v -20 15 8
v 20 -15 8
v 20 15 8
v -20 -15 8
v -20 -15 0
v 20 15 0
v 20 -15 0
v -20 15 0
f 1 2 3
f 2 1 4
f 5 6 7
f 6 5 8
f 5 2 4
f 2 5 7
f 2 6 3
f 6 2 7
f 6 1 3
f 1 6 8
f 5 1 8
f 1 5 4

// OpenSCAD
// file: BOSL2-2.0.766/std.scad
// Minimal BOSL2 compatibility shim for bundled gallery models.
// It implements only the helpers used by the imported OpenSCAD projects.

CENTER = [0, 0, 0];
BOTTOM = [0, 0, -1];
TOP = [0, 0, 1];
LEFT = [-1, 0, 0];
RIGHT = [1, 0, 0];
FRONT = [0, -1, 0];
BACK = [0, 1, 0];

module up(z=0) {
    translate([0, 0, z]) children();
}

module down(z=0) {
    translate([0, 0, -z]) children();
}

module attach(anchor=CENTER) {
    children();
}

module cuboid(size=[1, 1, 1], anchor=CENTER) {
    center = anchor == CENTER;
    translate(center ? [0, 0, 0] : [0, 0, size[2] / 2])
        cube(size, center=true);
    children();
}

module xcyl(h=1, r=1, anchor=CENTER) {
    center = anchor == CENTER;
    translate(center ? [0, 0, 0] : [h / 2, 0, 0])
        rotate([0, 90, 0])
            cylinder(h=h, r=r, center=true);
}
// main file
// Working pinned BOSL2 example: flat-bottomed plate with vertical rounded edges.
include <BOSL2-2.0.766/std.scad>
width = 40;
depth = 30;
height = 8;
corner_radius = 3;
$fa = $preview ? 8 : 3;
$fs = $preview ? 1 : 0.35;
assert(corner_radius >= 0 && width > 2*corner_radius && depth > 2*corner_radius && height > 0);
cuboid([width,depth,height], rounding=corner_radius, edges="Z", anchor=BOTTOM);
